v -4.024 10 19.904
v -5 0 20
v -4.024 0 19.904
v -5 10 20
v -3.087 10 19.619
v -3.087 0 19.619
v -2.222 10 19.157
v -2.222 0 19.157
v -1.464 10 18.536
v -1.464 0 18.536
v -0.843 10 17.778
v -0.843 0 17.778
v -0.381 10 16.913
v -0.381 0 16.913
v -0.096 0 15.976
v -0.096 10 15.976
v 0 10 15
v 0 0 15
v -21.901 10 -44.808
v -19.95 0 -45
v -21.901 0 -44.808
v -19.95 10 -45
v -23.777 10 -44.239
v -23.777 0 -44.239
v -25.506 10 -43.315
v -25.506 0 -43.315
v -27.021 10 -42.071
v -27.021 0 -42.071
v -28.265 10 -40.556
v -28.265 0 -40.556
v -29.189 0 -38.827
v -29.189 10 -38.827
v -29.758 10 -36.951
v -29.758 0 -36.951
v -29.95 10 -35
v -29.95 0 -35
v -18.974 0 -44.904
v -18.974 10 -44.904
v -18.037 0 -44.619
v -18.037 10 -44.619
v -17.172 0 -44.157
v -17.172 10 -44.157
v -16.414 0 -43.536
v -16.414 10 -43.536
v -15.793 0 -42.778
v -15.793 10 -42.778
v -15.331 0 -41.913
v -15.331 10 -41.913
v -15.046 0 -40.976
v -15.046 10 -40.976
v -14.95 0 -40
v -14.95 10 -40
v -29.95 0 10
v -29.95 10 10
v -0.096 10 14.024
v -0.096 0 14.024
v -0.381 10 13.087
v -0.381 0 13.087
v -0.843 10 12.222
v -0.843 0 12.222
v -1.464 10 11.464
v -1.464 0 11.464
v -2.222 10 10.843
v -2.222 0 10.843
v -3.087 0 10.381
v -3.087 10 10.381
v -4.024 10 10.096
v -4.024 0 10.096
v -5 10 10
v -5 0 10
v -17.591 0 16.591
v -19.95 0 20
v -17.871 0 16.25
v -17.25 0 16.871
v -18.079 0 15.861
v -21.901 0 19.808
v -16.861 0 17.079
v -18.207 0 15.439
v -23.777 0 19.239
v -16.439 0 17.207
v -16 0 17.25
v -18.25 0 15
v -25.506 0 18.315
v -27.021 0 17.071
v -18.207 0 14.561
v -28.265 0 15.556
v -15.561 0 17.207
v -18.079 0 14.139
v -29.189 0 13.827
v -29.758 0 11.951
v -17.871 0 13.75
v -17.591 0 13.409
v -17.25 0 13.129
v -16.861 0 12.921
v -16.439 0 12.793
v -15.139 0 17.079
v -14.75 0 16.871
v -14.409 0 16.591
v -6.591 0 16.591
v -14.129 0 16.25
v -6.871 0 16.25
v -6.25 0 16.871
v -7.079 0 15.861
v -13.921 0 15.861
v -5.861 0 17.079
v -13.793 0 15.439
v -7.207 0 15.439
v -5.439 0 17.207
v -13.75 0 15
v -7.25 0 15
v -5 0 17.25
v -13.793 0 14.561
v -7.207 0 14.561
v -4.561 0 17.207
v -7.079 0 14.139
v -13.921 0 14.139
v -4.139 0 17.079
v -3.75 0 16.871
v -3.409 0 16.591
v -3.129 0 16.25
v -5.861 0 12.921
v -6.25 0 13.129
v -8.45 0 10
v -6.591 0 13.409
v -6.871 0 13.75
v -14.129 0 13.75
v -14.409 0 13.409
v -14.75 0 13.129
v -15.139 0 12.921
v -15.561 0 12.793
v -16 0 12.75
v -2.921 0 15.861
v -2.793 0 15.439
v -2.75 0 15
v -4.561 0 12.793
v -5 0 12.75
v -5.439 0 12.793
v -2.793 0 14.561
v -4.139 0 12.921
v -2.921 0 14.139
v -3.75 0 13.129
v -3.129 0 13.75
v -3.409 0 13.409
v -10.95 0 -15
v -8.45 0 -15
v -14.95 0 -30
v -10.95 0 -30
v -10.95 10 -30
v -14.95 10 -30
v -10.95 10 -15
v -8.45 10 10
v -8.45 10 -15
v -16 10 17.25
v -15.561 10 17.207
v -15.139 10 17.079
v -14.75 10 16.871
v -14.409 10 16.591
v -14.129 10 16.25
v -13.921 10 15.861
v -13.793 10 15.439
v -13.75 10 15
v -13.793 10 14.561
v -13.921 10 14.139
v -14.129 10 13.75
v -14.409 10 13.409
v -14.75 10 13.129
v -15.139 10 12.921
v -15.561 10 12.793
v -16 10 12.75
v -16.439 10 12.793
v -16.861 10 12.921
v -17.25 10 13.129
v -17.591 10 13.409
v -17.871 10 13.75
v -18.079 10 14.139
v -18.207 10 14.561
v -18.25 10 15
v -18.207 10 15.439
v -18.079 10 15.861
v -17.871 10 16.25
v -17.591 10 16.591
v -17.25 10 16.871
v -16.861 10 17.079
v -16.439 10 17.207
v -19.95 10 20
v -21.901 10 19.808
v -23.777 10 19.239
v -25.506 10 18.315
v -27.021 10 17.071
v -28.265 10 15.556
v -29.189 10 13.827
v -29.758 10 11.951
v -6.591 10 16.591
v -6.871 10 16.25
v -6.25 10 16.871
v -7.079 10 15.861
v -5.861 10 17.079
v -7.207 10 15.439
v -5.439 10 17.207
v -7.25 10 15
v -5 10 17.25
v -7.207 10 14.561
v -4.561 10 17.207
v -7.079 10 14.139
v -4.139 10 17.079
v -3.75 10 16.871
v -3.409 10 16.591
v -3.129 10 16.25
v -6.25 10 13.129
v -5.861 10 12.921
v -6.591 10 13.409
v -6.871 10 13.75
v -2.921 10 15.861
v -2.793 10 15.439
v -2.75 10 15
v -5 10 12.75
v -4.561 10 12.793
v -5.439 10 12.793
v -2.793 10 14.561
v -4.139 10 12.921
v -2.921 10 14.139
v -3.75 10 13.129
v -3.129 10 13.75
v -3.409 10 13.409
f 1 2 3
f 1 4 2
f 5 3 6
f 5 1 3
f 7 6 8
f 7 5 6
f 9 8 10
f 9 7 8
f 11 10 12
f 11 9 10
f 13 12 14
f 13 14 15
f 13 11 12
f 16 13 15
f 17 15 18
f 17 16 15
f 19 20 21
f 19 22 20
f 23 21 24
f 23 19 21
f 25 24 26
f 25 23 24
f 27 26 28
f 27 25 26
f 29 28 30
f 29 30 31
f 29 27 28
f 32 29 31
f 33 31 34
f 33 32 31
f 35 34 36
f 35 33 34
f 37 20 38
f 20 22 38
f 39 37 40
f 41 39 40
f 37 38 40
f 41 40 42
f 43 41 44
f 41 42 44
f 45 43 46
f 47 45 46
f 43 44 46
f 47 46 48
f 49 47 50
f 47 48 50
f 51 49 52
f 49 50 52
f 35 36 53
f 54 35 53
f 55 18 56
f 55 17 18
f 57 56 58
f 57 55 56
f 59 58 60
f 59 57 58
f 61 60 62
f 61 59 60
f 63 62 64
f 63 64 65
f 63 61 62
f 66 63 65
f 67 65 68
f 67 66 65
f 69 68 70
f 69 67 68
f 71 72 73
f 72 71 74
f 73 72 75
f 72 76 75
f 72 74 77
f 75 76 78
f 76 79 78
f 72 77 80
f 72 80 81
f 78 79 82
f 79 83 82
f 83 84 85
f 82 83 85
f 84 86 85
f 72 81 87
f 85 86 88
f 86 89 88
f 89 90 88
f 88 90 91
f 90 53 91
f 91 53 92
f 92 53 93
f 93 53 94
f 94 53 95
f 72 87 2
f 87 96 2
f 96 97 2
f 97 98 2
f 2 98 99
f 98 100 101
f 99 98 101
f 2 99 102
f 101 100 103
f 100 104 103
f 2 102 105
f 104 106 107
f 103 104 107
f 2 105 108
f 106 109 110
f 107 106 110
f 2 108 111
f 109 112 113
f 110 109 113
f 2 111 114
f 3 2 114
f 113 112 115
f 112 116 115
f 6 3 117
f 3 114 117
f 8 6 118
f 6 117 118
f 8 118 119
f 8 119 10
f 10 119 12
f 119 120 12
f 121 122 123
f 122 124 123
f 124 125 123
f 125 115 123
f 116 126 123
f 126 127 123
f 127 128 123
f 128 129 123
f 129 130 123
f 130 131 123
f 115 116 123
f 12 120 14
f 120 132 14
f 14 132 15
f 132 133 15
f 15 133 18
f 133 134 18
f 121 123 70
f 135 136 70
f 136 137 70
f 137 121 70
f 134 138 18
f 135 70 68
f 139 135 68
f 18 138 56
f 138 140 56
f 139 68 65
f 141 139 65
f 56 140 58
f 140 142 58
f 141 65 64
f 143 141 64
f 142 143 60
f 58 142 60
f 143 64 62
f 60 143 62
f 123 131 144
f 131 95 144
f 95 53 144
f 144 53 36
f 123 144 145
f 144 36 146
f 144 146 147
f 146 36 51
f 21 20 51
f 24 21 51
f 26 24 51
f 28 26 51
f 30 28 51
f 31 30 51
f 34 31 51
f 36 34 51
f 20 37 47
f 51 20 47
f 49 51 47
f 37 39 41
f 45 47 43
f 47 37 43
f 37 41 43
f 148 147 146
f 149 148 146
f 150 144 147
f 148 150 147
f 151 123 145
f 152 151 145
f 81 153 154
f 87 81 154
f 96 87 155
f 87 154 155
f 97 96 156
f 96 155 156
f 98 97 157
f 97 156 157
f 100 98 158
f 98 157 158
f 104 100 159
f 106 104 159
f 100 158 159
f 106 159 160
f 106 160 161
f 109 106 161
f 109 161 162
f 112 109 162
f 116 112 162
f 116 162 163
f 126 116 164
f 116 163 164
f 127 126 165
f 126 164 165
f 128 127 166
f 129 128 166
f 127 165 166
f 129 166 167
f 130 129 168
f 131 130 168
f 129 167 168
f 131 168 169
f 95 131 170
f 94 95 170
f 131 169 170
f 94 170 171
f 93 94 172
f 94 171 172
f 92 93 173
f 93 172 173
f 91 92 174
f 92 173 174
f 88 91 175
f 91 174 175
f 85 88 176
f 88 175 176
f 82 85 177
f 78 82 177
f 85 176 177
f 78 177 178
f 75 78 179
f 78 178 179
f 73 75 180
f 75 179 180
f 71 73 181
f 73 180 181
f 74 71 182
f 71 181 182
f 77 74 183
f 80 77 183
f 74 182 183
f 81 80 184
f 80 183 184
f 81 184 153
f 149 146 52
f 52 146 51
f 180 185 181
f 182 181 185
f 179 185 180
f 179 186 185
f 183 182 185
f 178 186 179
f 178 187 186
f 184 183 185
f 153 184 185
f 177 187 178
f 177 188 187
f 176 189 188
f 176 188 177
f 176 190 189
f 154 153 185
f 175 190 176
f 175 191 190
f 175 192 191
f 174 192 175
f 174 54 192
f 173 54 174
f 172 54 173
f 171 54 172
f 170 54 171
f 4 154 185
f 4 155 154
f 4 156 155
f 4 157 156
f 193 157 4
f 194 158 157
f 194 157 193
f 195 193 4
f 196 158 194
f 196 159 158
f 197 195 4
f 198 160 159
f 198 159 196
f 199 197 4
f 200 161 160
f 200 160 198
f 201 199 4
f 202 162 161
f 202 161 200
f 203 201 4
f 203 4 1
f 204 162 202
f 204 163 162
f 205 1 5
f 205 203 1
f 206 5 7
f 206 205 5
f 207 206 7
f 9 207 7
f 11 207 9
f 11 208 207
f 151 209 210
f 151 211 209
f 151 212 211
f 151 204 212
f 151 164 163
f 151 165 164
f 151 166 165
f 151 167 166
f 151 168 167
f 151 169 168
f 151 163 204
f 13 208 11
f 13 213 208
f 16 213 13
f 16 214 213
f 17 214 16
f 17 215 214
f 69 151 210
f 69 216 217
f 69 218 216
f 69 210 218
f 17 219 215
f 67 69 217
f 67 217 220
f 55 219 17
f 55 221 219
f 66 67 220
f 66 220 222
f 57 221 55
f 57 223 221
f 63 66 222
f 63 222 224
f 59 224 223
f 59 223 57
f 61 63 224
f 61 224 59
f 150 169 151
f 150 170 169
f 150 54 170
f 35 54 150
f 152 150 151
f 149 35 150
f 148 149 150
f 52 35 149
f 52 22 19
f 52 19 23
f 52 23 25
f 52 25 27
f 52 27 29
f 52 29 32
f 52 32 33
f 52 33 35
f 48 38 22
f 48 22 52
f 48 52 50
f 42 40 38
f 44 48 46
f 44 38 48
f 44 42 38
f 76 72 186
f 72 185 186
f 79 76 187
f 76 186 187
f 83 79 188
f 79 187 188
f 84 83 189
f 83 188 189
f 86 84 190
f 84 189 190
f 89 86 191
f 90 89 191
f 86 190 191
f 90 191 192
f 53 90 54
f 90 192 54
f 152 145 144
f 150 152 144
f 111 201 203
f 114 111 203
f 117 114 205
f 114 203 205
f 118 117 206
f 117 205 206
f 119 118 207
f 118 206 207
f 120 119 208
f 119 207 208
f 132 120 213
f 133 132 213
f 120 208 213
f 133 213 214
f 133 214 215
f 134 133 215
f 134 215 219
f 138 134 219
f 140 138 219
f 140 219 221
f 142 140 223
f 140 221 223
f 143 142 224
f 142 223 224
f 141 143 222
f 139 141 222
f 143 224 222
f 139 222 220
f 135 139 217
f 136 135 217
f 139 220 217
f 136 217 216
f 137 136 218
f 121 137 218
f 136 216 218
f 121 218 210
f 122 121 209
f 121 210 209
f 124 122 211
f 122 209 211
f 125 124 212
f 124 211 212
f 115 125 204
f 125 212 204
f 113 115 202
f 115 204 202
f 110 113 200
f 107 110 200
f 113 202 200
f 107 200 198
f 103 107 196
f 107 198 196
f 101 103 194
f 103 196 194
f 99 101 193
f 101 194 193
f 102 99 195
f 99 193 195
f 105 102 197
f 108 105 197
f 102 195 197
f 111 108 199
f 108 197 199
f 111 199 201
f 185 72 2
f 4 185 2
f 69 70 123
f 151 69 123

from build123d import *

# Parameters (mm, degrees)
BOSS_EXTRUDE1_DEPTH = 10
SKETCH3_R           = 2.25
CUT_EXTRUDE1_DEPTH  = 10
FILLET1_R           = 10
FILLET2_R           = 5


with BuildPart() as part:
    # Sketch2 → Boss-Extrude1 (new body)
    with BuildSketch(Plane(origin=(0, 0, 0), x_dir=(1, 0, 0), z_dir=(0, 1, 0))):
        Polygon((-8.45, 15), (-10.95, 15), (-10.95, 30), (-14.95, 30), (-14.95, 45), (-29.95, 45), (-29.95, -20), (0, -20), (0, -10), (-8.45, -10), align=None)
    extrude(amount=BOSS_EXTRUDE1_DEPTH)

    # Sketch3 → Cut-Extrude1 (cut)
    with BuildSketch(Plane(origin=(0, 10, 0), x_dir=(1, 0, 0), z_dir=(0, 1, 0))):
        with Locations(Location((-5, -15, 0), (0, 0, 270))):
            Circle(SKETCH3_R)
        with Locations(Location((-16, -15, 0), (0, 0, 270))):
            Circle(SKETCH3_R)
    extrude(amount=-CUT_EXTRUDE1_DEPTH, mode=Mode.SUBTRACT)

    # Fillet1
    fillet1_edges = [part.edges().sort_by_distance(p)[0] for p in [
        (-29.95, 5, 20),
        (-29.95, 5, -45),
    ]]
    fillet(fillet1_edges, radius=FILLET1_R)

    # Fillet2
    fillet2_edges = [part.edges().sort_by_distance(p)[0] for p in [
        (-14.95, 5, -45),
        (0, 5, 10),
        (0, 5, 20),
    ]]
    fillet(fillet2_edges, radius=FILLET2_R - 0.0001)  # a hair under: the kernel refuses the full size


solid = part.part
